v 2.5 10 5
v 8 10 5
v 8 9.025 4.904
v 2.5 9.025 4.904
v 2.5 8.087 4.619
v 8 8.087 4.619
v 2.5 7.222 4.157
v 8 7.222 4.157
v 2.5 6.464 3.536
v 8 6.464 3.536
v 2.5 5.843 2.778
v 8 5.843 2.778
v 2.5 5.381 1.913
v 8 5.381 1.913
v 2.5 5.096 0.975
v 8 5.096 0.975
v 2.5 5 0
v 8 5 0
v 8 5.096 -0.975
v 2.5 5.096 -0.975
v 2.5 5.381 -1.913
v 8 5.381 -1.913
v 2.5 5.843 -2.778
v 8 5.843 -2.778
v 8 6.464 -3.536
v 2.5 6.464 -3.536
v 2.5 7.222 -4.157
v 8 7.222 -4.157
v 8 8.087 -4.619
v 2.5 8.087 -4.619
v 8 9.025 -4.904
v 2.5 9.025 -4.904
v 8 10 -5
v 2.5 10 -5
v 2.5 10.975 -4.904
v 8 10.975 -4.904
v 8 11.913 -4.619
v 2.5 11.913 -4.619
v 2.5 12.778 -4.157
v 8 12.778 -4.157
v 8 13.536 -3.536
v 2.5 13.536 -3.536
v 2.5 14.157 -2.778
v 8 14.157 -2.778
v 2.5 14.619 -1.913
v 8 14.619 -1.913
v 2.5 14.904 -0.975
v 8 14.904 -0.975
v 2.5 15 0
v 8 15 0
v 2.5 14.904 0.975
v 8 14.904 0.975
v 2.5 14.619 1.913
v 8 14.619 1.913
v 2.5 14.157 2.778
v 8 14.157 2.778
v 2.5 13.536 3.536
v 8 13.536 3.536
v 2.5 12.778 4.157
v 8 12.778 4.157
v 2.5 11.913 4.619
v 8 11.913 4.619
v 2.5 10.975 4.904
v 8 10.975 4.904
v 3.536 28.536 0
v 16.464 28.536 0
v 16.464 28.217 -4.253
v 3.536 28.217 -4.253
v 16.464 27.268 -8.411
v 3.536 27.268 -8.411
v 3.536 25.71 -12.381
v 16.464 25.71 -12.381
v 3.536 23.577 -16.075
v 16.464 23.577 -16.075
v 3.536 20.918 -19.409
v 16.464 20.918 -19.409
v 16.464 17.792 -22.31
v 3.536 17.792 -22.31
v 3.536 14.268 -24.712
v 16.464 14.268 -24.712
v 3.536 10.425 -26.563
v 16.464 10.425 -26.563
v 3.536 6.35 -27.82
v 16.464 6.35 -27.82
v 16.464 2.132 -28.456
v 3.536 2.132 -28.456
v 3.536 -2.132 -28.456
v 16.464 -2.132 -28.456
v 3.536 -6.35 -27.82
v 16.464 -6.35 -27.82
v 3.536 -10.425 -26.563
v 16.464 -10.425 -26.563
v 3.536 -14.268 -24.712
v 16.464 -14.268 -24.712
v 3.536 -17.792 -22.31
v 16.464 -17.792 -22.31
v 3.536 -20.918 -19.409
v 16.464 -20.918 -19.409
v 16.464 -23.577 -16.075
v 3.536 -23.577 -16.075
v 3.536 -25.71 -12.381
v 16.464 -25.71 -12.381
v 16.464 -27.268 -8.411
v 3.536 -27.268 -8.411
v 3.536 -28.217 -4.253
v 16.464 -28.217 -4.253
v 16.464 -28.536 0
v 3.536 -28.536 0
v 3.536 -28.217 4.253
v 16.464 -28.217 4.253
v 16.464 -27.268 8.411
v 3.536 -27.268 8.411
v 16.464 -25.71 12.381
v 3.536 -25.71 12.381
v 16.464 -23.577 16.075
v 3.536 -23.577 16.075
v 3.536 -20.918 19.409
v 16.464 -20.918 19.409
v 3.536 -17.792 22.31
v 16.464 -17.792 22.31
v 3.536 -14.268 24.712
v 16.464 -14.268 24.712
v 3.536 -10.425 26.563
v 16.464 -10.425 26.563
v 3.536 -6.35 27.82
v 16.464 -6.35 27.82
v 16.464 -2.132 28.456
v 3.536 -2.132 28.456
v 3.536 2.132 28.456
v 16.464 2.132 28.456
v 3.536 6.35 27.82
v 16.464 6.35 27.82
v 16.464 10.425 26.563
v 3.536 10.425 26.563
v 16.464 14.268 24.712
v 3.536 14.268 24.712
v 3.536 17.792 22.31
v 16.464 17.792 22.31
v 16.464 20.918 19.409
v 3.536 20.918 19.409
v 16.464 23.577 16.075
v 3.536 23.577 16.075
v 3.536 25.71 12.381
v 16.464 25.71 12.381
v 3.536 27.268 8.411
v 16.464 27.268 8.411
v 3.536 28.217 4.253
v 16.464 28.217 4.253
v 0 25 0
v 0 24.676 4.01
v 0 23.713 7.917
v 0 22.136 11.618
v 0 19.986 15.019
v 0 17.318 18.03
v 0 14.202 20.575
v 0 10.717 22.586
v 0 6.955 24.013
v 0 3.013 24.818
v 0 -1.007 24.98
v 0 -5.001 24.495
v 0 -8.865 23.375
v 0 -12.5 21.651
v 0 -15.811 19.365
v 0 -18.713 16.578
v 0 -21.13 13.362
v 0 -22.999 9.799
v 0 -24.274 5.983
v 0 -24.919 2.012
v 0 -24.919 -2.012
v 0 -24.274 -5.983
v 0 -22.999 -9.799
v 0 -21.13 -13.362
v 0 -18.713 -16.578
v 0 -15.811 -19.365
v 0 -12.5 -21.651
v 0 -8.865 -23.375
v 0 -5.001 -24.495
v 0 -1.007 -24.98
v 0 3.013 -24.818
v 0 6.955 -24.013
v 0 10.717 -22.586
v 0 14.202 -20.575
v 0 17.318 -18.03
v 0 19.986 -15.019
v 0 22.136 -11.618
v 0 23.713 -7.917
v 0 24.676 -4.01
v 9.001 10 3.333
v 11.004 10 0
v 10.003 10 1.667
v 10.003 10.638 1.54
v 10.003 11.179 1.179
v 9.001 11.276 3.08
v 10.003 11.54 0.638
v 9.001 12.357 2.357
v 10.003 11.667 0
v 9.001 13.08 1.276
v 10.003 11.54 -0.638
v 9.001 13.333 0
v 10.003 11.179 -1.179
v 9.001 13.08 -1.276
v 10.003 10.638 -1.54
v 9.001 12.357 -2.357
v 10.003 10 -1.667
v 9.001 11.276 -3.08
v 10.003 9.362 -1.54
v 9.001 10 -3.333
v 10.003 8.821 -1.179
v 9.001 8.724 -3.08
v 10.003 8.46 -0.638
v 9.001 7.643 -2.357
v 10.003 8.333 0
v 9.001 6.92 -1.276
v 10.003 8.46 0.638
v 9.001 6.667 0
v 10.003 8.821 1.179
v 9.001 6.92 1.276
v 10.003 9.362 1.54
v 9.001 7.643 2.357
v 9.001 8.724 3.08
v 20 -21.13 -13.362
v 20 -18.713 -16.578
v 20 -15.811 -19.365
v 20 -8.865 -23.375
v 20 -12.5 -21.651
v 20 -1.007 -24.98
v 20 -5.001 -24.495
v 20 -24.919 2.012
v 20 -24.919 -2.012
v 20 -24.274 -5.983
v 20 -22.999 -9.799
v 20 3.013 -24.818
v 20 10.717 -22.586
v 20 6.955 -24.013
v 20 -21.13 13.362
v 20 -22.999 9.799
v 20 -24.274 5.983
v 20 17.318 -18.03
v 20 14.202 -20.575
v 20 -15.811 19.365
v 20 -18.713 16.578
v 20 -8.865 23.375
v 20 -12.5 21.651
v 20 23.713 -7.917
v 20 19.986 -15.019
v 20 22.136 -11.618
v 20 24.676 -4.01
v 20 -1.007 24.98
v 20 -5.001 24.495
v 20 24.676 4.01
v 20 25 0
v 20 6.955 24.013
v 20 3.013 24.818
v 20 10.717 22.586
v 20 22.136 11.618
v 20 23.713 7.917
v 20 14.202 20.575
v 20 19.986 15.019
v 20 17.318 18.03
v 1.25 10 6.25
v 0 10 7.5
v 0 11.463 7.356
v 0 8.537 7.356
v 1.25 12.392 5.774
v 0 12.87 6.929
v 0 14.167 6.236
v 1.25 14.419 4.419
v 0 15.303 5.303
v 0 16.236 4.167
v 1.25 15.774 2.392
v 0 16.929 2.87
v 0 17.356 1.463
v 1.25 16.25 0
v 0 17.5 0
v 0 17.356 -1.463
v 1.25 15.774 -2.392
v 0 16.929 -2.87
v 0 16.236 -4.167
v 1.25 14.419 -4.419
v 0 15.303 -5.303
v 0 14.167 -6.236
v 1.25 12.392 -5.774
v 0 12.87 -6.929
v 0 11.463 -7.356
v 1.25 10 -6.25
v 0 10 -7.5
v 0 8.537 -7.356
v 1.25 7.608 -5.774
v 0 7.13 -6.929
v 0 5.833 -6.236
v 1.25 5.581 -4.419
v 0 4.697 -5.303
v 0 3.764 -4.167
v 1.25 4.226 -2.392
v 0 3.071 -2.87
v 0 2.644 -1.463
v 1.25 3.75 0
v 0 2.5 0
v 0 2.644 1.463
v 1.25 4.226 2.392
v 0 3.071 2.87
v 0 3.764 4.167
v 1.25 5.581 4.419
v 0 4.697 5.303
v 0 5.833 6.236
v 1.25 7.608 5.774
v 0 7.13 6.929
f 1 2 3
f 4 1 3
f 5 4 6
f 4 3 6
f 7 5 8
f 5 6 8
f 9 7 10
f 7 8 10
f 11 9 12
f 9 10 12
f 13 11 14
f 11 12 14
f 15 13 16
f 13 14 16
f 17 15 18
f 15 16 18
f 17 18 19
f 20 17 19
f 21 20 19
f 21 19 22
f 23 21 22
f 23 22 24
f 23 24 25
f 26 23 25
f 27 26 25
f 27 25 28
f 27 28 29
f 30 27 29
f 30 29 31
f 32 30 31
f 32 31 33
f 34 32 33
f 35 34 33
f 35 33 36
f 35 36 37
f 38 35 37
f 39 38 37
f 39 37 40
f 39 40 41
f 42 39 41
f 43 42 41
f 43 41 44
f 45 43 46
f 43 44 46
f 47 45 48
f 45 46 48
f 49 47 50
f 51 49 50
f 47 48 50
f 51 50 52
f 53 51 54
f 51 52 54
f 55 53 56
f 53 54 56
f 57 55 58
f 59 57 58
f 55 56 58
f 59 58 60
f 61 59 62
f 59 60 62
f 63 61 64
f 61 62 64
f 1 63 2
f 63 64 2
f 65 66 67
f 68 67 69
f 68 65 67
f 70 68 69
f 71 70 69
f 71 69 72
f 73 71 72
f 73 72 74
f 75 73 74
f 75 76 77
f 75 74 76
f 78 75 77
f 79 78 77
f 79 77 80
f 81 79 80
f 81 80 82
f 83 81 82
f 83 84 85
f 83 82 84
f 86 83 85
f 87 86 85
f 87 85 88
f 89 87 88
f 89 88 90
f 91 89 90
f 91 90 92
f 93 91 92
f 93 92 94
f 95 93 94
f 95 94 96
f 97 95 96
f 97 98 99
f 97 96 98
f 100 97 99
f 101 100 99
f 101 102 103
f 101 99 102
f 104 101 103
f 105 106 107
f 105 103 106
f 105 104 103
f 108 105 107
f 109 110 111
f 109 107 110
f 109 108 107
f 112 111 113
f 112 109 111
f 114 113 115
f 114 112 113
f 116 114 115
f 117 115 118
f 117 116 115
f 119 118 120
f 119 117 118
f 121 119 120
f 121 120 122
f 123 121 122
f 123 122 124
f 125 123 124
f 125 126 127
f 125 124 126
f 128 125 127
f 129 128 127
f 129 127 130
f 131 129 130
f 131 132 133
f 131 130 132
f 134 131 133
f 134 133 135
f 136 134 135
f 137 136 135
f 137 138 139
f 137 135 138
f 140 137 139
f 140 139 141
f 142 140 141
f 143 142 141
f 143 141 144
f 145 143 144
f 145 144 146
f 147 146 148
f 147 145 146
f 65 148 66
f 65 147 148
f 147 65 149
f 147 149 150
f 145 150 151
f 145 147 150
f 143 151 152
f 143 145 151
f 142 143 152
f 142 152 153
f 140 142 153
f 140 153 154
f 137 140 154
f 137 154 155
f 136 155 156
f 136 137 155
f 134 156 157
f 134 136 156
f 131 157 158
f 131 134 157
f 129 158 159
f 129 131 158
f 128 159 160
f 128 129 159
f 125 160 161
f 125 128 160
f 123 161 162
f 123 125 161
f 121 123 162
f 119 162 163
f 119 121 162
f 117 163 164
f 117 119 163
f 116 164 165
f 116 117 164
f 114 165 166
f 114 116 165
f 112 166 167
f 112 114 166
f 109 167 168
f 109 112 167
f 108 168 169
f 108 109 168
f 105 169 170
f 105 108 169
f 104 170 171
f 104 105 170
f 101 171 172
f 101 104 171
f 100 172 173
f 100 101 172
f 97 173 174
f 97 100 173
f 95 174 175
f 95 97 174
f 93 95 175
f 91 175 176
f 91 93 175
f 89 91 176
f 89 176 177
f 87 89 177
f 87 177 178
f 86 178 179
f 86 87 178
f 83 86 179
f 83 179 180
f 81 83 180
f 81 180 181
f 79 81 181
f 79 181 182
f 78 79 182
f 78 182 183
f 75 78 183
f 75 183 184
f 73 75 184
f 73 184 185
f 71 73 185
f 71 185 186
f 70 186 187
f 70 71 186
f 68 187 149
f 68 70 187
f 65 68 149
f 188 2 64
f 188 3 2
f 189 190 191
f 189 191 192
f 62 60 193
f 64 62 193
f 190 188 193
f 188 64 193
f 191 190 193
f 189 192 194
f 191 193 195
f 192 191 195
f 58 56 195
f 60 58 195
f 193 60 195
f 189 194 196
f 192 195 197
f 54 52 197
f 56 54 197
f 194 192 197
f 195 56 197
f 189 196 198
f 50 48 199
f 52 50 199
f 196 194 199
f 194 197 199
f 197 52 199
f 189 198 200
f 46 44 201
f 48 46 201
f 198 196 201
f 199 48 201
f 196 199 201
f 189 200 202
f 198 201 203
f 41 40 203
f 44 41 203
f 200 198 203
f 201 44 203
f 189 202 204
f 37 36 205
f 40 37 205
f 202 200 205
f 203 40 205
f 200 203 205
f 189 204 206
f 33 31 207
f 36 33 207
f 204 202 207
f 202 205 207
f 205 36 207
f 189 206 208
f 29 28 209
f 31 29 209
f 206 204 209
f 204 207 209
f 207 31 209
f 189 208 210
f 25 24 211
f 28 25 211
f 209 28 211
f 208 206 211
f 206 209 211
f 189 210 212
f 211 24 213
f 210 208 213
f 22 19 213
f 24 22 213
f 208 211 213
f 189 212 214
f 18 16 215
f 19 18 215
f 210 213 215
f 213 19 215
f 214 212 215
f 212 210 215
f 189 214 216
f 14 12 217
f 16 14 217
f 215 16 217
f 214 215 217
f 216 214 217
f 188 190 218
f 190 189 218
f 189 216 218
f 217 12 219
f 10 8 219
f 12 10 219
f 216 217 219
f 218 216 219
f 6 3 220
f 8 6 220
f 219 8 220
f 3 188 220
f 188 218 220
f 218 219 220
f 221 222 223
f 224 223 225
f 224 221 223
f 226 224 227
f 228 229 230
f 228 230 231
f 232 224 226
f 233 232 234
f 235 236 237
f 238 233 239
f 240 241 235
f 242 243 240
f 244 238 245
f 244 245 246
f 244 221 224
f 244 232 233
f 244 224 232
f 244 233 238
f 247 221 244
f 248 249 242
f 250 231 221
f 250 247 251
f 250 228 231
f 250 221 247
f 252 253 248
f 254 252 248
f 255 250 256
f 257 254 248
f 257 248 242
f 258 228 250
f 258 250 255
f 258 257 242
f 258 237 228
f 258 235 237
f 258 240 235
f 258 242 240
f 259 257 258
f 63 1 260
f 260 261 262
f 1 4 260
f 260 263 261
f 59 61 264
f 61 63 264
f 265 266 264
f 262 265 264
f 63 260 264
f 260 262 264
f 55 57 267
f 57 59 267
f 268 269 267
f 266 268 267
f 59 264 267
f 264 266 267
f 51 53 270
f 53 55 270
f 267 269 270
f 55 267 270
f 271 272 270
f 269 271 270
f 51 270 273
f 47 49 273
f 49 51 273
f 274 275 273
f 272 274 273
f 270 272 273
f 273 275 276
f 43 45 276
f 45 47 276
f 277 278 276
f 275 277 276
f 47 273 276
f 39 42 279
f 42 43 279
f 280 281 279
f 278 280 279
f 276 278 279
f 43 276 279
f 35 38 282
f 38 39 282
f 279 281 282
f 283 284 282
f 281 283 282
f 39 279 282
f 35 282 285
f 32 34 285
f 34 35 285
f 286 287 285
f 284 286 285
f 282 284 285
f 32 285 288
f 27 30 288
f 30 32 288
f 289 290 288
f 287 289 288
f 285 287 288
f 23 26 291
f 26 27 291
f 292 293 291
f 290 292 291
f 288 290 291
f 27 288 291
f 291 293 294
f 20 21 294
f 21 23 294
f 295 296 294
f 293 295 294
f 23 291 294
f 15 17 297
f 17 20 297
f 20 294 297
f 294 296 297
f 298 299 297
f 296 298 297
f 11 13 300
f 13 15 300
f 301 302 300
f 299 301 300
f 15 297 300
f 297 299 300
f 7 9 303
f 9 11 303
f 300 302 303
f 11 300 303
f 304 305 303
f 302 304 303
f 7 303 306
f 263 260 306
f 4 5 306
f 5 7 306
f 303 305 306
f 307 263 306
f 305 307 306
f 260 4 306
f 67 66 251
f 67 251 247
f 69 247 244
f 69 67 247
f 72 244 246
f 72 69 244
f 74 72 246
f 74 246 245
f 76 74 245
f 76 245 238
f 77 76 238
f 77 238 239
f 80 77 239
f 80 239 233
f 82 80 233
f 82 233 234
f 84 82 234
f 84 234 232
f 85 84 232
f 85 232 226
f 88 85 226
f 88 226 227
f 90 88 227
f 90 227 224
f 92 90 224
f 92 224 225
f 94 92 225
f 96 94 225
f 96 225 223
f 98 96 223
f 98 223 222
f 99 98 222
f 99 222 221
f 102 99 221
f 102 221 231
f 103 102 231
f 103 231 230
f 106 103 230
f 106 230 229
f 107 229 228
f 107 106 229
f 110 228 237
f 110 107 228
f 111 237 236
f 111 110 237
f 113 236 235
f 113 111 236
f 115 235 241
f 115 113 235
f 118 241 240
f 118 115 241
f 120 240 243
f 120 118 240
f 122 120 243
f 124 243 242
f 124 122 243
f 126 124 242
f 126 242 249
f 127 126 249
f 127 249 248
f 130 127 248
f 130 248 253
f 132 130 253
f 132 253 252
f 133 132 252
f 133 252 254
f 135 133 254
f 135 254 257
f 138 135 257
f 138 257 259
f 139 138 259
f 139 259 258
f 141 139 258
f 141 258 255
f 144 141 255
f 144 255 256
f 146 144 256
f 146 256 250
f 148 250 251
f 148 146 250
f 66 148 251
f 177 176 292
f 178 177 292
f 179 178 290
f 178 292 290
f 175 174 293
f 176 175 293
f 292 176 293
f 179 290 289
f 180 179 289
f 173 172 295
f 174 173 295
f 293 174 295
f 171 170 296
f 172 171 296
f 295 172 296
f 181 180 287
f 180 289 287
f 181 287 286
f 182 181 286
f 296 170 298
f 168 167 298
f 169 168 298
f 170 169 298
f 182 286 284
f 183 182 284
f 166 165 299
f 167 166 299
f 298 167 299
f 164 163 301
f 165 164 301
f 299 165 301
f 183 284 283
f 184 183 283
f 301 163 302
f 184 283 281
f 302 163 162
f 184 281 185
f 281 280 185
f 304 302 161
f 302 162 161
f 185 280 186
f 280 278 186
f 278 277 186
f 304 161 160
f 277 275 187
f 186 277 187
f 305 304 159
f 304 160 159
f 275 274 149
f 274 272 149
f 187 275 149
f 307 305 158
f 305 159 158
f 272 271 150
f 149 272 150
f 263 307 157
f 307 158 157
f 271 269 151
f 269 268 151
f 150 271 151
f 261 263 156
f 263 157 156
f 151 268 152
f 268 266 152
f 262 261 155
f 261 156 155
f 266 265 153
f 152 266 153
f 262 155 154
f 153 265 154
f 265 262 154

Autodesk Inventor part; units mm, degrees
ref_plane "YZ Plane" through (0, 0, 0) normal (1, 0, 0) x (0, 1, 0)
ref_plane "XZ Plane" through (0, 0, 0) normal (0, 1, 0) x (-1, 0, 0)
ref_plane "XY Plane" through (0, 0, 0) normal (0, 0, 1) x (1, 0, 0)
sketch "Эскиз1" plane through (0, 0, 0) normal (0, 0, 1) x (1, 0, 0)
  line L0 (0, 0) -> (20, 0)
  line L1 (0, 0) -> (0, 25)
  line L2 (0, 25) -> (3.5355, 28.5355)
  line L3 (20, 0) -> (20, 25)
  line L4 (20, 25) -> (16.4645, 28.5355)
  line L5 (16.4645, 28.5355) -> (3.5355, 28.5355)
  dimension "d0" = 20
  dimension "d1" = 25
  dimension "d2" = 5
  dimension "d3" = 135
  dimension "d4" = 5
  dimension "d5" = 135
revolve "Вращение1" add sketch "Эскиз1" angle 360 about axis through (0, 0, 0) along (1, 0, 0)
sketch "Эскиз2" plane through (0, 0, 0) normal (-1, 0, 0) x (0, 0, 1)
  line L0 (0, 0) -> (0, 10) construction
  dimension "d7" = 10
hole "Отверстие1" at (0, 10, 0) direction (1, 0, 0) diameter 10 depth 8 tip angle 118 countersink diameter 15 countersink angle 90
properties part number "711112"
